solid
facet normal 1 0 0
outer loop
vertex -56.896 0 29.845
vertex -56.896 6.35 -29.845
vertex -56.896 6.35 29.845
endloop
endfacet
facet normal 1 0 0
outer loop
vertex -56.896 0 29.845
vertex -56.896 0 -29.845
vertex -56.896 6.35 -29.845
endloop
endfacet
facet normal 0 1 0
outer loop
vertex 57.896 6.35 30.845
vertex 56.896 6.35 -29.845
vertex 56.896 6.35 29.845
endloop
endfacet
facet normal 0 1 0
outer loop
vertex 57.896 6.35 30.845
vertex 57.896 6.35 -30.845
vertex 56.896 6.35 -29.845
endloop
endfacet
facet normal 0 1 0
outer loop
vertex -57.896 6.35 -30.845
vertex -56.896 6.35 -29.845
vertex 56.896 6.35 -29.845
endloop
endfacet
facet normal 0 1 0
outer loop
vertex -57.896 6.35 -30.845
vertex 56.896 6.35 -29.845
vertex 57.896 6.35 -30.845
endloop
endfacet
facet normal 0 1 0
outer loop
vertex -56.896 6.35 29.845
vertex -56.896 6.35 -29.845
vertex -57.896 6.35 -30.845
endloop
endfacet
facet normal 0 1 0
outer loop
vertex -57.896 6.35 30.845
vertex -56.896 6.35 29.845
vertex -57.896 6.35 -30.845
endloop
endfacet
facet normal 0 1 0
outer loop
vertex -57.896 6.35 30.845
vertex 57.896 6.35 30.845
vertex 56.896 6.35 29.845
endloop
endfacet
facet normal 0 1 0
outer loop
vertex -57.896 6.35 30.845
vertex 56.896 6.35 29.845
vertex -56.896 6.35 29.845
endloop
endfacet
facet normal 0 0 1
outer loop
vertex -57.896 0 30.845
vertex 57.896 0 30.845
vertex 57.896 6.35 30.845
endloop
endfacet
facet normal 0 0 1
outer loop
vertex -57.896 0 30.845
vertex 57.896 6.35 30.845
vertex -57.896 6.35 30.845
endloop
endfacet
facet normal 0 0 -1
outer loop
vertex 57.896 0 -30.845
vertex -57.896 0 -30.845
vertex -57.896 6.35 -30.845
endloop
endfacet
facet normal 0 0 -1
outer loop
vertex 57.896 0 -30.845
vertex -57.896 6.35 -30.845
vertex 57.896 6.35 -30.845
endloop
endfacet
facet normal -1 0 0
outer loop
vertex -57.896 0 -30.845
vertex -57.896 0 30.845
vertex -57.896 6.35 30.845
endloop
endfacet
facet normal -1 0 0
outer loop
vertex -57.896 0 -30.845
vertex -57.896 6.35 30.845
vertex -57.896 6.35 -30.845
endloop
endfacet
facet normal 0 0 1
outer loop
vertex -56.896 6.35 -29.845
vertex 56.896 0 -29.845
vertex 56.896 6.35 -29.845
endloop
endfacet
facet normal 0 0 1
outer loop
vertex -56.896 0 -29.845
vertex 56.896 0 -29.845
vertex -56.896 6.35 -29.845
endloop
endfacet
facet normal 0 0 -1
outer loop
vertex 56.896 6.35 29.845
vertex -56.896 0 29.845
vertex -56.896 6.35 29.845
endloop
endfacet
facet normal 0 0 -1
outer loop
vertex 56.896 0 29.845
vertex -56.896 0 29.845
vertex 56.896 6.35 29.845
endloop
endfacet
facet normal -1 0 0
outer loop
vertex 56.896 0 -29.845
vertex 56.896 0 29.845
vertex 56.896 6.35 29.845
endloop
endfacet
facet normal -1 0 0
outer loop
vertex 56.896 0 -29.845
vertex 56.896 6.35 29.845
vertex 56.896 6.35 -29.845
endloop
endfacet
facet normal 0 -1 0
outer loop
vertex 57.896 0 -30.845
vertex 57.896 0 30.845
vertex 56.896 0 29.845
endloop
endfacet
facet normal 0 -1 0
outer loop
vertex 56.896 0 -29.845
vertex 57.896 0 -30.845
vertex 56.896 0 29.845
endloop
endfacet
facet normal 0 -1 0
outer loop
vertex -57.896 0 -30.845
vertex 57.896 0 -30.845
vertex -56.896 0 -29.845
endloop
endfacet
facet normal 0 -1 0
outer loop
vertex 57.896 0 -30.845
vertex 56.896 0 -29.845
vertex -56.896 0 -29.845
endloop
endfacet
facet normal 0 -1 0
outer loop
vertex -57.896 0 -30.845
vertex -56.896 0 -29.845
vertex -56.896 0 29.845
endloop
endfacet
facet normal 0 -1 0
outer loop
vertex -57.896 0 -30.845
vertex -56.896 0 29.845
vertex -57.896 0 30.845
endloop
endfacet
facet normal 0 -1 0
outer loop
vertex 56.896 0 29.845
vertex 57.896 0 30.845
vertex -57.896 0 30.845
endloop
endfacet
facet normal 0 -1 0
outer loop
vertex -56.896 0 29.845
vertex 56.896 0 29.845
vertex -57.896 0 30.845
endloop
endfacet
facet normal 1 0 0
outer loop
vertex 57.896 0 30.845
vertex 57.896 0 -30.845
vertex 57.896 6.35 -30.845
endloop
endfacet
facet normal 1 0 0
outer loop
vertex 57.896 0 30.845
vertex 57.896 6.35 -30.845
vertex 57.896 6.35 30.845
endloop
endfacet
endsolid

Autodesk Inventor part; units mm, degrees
ref_plane "YZ Plane" through (0, 0, 0) normal (1, 0, 0) x (0, 1, 0)
ref_plane "XZ Plane" through (0, 0, 0) normal (0, 1, 0) x (-1, 0, 0)
ref_plane "XY Plane" through (0, 0, 0) normal (0, 0, 1) x (1, 0, 0)
sketch "Sketch1" plane through (0, 0, 0) normal (0, 1, 0) x (-1, 0, 0)
  line L0 (56.896, 29.845) -> (-56.896, 29.845)
  line L1 (-56.896, 29.845) -> (-56.896, -29.845)
  line L2 (-56.896, -29.845) -> (56.896, -29.845)
  line L3 (56.896, -29.845) -> (56.896, 29.845)
  line L4 (56.896, 29.845) -> (-56.896, -29.845) construction
  line L5 (-56.896, 29.845) -> (56.896, -29.845) construction
  line L6 (57.896, -30.845) -> (-57.896, -30.845)
  line L7 (-57.896, -30.845) -> (-57.896, 30.845)
  line L8 (-57.896, 30.845) -> (57.896, 30.845)
  line L9 (57.896, 30.845) -> (57.896, -30.845)
  point P0 (0, 0)
  dimension "d0" = 113.792
  dimension "d1" = 59.69
  dimension "d2" = 1
extrude "Extrusion1" add sketch "Sketch1" along normal blind 6.35
properties part number "band" material "Rubber"
